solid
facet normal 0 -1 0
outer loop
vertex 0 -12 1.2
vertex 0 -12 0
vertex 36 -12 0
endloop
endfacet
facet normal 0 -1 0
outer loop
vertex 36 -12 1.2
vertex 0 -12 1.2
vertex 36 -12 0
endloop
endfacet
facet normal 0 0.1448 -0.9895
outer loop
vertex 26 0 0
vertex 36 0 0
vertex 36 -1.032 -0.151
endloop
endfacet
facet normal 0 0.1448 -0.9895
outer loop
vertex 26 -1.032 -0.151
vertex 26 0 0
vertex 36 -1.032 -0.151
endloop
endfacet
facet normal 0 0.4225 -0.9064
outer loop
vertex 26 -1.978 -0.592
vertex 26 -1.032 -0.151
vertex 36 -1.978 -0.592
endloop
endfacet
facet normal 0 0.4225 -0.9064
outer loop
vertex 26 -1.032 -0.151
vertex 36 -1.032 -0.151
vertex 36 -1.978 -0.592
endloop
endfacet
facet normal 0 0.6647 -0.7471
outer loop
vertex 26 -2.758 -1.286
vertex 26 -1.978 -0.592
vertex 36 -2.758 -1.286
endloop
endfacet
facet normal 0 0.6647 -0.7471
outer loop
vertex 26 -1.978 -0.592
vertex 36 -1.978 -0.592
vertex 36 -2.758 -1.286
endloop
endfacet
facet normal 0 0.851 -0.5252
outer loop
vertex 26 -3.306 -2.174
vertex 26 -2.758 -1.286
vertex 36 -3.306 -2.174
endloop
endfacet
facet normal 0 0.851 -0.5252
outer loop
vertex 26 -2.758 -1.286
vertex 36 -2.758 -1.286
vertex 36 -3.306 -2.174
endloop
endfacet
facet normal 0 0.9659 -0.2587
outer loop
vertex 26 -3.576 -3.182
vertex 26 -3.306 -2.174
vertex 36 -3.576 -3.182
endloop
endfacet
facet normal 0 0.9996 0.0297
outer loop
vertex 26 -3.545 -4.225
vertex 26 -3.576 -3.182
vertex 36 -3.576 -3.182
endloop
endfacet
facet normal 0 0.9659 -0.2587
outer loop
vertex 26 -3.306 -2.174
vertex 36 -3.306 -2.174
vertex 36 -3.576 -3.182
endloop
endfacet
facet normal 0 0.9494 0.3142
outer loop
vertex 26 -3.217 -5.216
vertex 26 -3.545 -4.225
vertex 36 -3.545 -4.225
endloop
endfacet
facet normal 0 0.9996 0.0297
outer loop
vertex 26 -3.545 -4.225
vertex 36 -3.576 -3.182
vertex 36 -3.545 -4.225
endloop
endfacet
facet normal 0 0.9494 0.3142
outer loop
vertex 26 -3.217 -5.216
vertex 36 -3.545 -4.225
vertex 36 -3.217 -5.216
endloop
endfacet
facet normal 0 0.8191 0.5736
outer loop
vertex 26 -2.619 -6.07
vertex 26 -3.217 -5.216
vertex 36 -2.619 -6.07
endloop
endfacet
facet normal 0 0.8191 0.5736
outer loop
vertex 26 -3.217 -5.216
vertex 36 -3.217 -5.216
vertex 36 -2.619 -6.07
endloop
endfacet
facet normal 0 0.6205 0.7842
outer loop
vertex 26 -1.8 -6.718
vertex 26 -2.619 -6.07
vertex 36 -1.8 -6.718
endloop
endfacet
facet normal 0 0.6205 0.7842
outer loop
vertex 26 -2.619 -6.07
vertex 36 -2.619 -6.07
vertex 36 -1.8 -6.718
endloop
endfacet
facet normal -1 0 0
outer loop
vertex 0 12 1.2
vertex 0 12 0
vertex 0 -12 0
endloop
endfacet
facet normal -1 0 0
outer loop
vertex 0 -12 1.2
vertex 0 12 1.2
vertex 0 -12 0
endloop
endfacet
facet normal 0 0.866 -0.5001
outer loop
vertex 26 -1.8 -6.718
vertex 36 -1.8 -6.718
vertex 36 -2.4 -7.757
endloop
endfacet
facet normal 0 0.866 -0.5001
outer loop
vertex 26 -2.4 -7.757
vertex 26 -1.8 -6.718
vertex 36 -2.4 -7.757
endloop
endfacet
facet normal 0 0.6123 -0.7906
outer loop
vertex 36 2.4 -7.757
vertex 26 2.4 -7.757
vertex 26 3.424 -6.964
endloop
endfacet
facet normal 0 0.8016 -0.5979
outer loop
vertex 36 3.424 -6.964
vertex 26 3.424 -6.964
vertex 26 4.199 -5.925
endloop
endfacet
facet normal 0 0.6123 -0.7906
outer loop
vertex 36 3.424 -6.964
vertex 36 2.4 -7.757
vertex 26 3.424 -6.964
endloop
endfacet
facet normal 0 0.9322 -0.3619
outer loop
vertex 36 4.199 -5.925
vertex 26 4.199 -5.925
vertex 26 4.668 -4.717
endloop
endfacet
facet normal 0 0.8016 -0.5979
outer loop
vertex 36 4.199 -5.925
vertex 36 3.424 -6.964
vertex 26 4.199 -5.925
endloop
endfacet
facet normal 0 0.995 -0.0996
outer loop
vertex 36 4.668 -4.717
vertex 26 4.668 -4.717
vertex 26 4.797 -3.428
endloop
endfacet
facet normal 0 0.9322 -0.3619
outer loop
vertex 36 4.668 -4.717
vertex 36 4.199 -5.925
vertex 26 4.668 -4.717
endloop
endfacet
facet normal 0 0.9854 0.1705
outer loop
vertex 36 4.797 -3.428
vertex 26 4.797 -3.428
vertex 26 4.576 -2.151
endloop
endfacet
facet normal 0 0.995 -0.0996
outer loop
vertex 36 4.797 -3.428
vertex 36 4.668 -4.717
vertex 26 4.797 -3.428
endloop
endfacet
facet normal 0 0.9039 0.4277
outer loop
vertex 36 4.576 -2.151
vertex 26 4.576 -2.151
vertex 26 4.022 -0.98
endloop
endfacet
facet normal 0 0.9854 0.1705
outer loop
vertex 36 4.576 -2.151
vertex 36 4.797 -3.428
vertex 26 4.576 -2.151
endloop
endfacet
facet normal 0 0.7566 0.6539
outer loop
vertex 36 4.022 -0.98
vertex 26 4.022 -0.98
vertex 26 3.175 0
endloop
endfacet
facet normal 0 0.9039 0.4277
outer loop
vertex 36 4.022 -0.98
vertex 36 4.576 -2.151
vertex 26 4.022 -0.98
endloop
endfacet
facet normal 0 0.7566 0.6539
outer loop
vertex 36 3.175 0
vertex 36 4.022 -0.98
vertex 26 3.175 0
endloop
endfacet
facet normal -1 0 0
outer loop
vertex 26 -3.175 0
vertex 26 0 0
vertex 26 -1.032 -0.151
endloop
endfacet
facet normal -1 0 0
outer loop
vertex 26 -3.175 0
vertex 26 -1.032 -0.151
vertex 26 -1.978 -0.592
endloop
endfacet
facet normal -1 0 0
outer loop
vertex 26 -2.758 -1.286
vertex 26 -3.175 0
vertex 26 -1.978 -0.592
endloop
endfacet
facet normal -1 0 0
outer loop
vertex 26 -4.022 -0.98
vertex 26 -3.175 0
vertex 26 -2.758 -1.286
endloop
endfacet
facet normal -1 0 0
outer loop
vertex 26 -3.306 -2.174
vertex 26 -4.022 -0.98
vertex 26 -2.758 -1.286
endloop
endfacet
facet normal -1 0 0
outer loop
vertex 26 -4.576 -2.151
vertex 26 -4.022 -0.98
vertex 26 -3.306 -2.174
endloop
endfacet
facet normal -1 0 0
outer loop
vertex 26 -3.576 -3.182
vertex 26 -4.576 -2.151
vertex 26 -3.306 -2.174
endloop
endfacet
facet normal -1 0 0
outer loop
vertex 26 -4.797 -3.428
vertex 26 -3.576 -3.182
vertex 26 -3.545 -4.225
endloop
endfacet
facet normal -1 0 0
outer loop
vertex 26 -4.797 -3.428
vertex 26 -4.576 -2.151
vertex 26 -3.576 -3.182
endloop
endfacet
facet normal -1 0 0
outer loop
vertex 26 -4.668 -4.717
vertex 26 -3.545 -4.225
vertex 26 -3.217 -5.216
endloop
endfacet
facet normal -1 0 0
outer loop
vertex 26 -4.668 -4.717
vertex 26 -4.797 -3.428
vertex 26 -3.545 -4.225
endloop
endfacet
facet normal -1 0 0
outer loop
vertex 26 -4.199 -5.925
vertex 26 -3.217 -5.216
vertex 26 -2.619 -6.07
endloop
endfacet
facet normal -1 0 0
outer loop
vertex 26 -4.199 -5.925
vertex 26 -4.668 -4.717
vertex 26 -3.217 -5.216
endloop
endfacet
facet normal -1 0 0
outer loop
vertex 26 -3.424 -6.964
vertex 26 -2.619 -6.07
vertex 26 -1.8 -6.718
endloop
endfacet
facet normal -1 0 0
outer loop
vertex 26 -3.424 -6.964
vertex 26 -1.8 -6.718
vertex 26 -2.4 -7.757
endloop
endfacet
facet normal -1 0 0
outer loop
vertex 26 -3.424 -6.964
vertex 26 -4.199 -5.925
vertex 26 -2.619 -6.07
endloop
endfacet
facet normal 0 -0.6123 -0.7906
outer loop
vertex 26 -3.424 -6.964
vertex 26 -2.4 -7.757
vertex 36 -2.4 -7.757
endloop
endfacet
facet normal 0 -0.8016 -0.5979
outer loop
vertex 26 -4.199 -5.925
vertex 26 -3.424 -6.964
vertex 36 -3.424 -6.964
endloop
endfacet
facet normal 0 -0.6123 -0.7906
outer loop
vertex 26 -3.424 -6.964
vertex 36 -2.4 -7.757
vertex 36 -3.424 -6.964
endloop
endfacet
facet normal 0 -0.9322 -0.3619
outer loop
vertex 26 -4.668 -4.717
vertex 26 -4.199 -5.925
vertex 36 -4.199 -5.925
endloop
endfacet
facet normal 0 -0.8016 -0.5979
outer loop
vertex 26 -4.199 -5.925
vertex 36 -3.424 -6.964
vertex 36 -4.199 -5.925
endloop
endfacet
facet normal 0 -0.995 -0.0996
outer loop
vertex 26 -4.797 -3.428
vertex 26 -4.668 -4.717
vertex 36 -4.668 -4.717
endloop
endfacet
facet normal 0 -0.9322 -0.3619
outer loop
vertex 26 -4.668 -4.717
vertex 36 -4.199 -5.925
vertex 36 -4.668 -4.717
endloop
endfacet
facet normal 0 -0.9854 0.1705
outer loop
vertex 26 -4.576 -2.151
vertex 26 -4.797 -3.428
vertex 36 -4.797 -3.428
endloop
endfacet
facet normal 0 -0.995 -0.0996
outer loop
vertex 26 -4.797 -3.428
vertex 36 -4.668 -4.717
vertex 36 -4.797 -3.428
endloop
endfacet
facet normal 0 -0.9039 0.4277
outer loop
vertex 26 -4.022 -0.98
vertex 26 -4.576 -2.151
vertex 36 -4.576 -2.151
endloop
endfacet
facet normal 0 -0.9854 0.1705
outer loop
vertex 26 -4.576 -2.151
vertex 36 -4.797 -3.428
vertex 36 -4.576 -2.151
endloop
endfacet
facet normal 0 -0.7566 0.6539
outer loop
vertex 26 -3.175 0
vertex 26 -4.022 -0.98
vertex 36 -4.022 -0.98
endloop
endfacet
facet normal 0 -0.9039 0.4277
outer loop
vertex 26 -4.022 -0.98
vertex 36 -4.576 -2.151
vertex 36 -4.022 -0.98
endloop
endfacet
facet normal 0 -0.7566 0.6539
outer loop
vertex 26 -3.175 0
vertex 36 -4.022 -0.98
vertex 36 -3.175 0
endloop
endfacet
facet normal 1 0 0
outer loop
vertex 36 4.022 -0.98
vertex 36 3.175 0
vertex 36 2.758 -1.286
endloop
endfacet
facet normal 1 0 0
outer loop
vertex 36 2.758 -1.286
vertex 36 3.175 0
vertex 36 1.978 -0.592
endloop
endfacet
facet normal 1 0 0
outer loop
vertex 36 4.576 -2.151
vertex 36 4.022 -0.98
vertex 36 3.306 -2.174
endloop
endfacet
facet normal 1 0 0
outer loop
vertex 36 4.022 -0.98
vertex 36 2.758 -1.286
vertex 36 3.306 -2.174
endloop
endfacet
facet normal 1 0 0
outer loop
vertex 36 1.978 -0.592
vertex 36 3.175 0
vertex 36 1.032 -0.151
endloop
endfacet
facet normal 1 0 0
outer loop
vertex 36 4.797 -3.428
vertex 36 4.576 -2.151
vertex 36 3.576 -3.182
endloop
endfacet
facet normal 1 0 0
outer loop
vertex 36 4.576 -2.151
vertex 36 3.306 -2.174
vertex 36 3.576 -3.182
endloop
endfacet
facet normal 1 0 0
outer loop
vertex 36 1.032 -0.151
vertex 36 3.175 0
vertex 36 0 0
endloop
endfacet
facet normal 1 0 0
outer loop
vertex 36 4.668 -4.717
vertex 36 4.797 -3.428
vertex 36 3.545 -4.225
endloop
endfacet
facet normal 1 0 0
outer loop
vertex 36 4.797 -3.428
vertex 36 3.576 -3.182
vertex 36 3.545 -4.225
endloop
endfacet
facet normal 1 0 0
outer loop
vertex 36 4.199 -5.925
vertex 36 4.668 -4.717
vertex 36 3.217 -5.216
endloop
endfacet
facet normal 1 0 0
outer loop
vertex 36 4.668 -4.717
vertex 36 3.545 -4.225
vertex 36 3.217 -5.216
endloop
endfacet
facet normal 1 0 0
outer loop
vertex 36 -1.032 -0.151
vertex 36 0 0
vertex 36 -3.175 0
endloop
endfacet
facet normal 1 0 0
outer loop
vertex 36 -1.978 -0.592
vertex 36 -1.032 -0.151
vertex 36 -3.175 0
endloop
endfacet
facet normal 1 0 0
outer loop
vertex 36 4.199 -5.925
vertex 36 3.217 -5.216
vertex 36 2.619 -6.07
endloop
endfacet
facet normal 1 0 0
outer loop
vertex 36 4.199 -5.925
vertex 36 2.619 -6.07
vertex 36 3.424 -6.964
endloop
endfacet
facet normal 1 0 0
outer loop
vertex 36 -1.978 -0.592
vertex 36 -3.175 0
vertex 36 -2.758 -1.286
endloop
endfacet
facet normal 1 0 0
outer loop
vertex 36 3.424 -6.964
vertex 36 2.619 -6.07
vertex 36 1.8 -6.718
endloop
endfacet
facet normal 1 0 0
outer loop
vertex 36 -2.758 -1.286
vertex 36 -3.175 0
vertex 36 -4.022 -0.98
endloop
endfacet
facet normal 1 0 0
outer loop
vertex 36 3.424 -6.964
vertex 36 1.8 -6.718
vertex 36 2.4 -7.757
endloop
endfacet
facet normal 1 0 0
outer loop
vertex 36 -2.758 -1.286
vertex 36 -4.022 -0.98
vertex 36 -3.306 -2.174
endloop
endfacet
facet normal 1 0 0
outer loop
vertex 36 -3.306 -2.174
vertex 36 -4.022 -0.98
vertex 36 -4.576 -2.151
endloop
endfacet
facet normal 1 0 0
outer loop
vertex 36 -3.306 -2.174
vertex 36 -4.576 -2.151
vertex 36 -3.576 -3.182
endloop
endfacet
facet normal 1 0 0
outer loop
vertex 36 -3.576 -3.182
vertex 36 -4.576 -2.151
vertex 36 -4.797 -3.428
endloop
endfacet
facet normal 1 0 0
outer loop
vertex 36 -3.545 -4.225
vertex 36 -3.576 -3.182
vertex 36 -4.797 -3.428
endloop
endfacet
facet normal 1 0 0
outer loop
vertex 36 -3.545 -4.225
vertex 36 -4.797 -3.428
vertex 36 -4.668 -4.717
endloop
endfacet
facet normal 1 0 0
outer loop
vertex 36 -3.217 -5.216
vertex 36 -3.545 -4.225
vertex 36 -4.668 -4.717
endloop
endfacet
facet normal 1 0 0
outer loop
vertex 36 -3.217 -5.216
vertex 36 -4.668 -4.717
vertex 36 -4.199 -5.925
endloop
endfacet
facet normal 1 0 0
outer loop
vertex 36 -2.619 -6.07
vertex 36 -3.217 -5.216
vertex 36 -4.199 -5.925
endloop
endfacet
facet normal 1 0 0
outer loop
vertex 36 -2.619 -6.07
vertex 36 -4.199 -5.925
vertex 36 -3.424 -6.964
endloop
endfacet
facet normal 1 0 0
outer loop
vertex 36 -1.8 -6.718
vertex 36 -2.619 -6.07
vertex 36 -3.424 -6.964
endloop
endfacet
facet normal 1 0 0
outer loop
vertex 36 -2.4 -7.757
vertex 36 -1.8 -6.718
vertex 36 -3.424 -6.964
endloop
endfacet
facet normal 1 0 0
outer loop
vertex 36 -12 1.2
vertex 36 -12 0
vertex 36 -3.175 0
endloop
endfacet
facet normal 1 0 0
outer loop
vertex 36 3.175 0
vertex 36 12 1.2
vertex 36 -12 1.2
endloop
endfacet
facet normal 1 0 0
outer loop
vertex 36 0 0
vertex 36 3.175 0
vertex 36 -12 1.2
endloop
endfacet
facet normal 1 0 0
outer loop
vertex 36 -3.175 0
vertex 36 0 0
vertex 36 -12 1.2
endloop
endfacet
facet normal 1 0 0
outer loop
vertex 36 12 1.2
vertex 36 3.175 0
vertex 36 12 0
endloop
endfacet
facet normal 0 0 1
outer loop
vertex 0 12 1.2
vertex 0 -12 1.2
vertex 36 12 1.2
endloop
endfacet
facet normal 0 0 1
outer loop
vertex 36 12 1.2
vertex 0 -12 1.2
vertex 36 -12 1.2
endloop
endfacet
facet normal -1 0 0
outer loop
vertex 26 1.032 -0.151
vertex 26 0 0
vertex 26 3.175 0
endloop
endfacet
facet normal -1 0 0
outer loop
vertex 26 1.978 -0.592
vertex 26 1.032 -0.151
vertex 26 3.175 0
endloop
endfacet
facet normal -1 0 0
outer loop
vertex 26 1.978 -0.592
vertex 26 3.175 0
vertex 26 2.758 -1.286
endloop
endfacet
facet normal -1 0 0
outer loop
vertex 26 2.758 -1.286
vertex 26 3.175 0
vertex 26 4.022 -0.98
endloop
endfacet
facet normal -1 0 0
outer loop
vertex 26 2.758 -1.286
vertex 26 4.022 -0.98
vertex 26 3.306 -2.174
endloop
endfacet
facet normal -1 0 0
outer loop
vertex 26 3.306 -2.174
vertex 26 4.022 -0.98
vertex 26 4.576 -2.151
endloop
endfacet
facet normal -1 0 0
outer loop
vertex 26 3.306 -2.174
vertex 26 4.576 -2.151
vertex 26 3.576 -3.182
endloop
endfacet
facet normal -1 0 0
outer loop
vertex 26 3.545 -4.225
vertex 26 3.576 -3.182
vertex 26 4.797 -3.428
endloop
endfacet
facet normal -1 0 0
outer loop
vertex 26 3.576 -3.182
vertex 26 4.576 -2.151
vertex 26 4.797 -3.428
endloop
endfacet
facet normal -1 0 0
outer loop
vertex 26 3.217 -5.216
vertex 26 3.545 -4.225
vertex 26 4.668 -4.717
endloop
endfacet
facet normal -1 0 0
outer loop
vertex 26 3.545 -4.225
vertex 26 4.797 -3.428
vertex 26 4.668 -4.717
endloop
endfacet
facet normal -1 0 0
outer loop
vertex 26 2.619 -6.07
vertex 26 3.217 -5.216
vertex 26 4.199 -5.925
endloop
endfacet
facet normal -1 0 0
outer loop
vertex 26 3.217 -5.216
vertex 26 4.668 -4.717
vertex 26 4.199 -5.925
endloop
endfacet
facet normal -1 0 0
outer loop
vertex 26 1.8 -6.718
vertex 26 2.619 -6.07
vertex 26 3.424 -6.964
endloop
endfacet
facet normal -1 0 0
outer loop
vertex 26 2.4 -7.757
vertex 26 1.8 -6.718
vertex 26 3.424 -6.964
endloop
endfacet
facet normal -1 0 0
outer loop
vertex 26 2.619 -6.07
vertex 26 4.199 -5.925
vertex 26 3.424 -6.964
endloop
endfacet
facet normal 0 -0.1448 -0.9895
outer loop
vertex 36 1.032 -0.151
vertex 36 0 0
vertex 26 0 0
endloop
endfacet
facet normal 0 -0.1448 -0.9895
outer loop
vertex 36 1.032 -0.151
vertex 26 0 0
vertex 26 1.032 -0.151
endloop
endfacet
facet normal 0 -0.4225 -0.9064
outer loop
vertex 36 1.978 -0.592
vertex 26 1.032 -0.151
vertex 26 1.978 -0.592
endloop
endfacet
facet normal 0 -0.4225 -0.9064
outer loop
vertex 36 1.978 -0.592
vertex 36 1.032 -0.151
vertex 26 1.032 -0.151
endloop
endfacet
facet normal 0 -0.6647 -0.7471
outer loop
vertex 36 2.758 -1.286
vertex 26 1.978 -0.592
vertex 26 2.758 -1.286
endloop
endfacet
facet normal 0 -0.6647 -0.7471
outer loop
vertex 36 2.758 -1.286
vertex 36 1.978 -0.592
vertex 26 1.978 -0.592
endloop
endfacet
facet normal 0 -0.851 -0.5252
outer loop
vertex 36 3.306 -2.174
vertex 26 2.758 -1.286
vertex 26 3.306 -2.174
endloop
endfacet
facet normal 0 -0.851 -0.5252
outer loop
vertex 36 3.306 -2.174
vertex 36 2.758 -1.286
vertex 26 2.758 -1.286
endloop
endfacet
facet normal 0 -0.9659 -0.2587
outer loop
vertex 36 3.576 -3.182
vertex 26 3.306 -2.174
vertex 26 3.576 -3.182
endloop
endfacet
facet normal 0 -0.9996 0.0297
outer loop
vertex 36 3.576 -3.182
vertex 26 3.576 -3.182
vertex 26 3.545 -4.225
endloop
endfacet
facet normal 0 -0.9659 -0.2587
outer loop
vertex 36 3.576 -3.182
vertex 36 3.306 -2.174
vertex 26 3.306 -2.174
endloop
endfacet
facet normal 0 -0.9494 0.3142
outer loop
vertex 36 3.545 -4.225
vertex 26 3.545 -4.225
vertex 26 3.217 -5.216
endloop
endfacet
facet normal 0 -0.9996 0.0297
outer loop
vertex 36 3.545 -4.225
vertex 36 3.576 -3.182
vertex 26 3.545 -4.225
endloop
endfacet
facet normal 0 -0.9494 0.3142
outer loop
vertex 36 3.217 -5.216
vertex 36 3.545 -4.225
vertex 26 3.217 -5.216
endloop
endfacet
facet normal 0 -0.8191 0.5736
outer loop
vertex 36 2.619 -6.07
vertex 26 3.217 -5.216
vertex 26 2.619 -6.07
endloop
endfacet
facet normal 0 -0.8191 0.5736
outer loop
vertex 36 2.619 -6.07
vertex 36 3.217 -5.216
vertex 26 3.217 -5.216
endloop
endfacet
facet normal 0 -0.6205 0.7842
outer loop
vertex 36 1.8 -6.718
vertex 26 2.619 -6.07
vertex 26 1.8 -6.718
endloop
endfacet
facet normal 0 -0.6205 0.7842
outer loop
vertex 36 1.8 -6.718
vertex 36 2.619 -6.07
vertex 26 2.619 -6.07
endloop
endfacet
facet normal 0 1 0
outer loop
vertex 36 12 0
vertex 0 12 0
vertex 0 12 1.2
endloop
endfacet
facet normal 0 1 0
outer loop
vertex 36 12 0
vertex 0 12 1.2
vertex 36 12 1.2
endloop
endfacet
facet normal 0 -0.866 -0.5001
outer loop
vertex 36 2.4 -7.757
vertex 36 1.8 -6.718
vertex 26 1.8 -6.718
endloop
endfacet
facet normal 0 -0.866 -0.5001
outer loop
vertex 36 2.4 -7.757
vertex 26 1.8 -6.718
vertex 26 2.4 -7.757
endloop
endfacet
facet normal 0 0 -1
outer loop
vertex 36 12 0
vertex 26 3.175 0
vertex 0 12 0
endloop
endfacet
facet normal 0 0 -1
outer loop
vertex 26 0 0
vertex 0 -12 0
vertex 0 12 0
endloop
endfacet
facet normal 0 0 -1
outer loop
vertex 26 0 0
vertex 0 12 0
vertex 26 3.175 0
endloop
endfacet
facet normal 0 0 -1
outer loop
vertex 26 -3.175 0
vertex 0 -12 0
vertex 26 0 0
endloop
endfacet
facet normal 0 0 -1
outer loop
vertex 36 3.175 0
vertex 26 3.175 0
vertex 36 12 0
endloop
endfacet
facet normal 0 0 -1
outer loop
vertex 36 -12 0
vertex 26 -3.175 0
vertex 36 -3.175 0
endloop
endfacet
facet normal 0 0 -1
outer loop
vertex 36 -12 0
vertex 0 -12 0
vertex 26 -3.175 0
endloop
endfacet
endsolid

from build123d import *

# Parameters (mm, degrees)
SKETCH11_W          = 36
SKETCH11_H          = 12
BOSS_EXTRUDE3_DEPTH = 1.2
EXTRUDE_THIN2_START = 36
EXTRUDE_THIN2_DEPTH = 10


with BuildPart() as part:
    # Sketch11 → Boss-Extrude3 (new body)
    with BuildSketch(Plane.XY):
        with Locations((18, 6)):
            Rectangle(SKETCH11_W, SKETCH11_H)
    extrude(amount=BOSS_EXTRUDE3_DEPTH)

    # Sketch2 → Extrude-Thin2 (add)
    with BuildSketch(Plane(origin=(0, 0, 0), x_dir=(0, 0, -1), z_dir=(1, 0, 0)).offset(EXTRUDE_THIN2_START)):
        with BuildLine():
            ThreePointArc((0, 0), (2.668251438, 3.477332975), (6.717691454, 1.8))
            Line((6.717691454, 1.8), (7.756921938, 2.4))
            ThreePointArc((7.756921938, 2.4), (2.357668584, 4.636443966), (-1.2, 0))
            Line((-1.2, 0), (0, 0))
        make_face()
    extrude(amount=-EXTRUDE_THIN2_DEPTH)

    # Mirror1: part across plane


with BuildPart() as part_1:
    add(part.part)
    add(part.part.mirror(Plane.ZX))


solid = part_1.part
